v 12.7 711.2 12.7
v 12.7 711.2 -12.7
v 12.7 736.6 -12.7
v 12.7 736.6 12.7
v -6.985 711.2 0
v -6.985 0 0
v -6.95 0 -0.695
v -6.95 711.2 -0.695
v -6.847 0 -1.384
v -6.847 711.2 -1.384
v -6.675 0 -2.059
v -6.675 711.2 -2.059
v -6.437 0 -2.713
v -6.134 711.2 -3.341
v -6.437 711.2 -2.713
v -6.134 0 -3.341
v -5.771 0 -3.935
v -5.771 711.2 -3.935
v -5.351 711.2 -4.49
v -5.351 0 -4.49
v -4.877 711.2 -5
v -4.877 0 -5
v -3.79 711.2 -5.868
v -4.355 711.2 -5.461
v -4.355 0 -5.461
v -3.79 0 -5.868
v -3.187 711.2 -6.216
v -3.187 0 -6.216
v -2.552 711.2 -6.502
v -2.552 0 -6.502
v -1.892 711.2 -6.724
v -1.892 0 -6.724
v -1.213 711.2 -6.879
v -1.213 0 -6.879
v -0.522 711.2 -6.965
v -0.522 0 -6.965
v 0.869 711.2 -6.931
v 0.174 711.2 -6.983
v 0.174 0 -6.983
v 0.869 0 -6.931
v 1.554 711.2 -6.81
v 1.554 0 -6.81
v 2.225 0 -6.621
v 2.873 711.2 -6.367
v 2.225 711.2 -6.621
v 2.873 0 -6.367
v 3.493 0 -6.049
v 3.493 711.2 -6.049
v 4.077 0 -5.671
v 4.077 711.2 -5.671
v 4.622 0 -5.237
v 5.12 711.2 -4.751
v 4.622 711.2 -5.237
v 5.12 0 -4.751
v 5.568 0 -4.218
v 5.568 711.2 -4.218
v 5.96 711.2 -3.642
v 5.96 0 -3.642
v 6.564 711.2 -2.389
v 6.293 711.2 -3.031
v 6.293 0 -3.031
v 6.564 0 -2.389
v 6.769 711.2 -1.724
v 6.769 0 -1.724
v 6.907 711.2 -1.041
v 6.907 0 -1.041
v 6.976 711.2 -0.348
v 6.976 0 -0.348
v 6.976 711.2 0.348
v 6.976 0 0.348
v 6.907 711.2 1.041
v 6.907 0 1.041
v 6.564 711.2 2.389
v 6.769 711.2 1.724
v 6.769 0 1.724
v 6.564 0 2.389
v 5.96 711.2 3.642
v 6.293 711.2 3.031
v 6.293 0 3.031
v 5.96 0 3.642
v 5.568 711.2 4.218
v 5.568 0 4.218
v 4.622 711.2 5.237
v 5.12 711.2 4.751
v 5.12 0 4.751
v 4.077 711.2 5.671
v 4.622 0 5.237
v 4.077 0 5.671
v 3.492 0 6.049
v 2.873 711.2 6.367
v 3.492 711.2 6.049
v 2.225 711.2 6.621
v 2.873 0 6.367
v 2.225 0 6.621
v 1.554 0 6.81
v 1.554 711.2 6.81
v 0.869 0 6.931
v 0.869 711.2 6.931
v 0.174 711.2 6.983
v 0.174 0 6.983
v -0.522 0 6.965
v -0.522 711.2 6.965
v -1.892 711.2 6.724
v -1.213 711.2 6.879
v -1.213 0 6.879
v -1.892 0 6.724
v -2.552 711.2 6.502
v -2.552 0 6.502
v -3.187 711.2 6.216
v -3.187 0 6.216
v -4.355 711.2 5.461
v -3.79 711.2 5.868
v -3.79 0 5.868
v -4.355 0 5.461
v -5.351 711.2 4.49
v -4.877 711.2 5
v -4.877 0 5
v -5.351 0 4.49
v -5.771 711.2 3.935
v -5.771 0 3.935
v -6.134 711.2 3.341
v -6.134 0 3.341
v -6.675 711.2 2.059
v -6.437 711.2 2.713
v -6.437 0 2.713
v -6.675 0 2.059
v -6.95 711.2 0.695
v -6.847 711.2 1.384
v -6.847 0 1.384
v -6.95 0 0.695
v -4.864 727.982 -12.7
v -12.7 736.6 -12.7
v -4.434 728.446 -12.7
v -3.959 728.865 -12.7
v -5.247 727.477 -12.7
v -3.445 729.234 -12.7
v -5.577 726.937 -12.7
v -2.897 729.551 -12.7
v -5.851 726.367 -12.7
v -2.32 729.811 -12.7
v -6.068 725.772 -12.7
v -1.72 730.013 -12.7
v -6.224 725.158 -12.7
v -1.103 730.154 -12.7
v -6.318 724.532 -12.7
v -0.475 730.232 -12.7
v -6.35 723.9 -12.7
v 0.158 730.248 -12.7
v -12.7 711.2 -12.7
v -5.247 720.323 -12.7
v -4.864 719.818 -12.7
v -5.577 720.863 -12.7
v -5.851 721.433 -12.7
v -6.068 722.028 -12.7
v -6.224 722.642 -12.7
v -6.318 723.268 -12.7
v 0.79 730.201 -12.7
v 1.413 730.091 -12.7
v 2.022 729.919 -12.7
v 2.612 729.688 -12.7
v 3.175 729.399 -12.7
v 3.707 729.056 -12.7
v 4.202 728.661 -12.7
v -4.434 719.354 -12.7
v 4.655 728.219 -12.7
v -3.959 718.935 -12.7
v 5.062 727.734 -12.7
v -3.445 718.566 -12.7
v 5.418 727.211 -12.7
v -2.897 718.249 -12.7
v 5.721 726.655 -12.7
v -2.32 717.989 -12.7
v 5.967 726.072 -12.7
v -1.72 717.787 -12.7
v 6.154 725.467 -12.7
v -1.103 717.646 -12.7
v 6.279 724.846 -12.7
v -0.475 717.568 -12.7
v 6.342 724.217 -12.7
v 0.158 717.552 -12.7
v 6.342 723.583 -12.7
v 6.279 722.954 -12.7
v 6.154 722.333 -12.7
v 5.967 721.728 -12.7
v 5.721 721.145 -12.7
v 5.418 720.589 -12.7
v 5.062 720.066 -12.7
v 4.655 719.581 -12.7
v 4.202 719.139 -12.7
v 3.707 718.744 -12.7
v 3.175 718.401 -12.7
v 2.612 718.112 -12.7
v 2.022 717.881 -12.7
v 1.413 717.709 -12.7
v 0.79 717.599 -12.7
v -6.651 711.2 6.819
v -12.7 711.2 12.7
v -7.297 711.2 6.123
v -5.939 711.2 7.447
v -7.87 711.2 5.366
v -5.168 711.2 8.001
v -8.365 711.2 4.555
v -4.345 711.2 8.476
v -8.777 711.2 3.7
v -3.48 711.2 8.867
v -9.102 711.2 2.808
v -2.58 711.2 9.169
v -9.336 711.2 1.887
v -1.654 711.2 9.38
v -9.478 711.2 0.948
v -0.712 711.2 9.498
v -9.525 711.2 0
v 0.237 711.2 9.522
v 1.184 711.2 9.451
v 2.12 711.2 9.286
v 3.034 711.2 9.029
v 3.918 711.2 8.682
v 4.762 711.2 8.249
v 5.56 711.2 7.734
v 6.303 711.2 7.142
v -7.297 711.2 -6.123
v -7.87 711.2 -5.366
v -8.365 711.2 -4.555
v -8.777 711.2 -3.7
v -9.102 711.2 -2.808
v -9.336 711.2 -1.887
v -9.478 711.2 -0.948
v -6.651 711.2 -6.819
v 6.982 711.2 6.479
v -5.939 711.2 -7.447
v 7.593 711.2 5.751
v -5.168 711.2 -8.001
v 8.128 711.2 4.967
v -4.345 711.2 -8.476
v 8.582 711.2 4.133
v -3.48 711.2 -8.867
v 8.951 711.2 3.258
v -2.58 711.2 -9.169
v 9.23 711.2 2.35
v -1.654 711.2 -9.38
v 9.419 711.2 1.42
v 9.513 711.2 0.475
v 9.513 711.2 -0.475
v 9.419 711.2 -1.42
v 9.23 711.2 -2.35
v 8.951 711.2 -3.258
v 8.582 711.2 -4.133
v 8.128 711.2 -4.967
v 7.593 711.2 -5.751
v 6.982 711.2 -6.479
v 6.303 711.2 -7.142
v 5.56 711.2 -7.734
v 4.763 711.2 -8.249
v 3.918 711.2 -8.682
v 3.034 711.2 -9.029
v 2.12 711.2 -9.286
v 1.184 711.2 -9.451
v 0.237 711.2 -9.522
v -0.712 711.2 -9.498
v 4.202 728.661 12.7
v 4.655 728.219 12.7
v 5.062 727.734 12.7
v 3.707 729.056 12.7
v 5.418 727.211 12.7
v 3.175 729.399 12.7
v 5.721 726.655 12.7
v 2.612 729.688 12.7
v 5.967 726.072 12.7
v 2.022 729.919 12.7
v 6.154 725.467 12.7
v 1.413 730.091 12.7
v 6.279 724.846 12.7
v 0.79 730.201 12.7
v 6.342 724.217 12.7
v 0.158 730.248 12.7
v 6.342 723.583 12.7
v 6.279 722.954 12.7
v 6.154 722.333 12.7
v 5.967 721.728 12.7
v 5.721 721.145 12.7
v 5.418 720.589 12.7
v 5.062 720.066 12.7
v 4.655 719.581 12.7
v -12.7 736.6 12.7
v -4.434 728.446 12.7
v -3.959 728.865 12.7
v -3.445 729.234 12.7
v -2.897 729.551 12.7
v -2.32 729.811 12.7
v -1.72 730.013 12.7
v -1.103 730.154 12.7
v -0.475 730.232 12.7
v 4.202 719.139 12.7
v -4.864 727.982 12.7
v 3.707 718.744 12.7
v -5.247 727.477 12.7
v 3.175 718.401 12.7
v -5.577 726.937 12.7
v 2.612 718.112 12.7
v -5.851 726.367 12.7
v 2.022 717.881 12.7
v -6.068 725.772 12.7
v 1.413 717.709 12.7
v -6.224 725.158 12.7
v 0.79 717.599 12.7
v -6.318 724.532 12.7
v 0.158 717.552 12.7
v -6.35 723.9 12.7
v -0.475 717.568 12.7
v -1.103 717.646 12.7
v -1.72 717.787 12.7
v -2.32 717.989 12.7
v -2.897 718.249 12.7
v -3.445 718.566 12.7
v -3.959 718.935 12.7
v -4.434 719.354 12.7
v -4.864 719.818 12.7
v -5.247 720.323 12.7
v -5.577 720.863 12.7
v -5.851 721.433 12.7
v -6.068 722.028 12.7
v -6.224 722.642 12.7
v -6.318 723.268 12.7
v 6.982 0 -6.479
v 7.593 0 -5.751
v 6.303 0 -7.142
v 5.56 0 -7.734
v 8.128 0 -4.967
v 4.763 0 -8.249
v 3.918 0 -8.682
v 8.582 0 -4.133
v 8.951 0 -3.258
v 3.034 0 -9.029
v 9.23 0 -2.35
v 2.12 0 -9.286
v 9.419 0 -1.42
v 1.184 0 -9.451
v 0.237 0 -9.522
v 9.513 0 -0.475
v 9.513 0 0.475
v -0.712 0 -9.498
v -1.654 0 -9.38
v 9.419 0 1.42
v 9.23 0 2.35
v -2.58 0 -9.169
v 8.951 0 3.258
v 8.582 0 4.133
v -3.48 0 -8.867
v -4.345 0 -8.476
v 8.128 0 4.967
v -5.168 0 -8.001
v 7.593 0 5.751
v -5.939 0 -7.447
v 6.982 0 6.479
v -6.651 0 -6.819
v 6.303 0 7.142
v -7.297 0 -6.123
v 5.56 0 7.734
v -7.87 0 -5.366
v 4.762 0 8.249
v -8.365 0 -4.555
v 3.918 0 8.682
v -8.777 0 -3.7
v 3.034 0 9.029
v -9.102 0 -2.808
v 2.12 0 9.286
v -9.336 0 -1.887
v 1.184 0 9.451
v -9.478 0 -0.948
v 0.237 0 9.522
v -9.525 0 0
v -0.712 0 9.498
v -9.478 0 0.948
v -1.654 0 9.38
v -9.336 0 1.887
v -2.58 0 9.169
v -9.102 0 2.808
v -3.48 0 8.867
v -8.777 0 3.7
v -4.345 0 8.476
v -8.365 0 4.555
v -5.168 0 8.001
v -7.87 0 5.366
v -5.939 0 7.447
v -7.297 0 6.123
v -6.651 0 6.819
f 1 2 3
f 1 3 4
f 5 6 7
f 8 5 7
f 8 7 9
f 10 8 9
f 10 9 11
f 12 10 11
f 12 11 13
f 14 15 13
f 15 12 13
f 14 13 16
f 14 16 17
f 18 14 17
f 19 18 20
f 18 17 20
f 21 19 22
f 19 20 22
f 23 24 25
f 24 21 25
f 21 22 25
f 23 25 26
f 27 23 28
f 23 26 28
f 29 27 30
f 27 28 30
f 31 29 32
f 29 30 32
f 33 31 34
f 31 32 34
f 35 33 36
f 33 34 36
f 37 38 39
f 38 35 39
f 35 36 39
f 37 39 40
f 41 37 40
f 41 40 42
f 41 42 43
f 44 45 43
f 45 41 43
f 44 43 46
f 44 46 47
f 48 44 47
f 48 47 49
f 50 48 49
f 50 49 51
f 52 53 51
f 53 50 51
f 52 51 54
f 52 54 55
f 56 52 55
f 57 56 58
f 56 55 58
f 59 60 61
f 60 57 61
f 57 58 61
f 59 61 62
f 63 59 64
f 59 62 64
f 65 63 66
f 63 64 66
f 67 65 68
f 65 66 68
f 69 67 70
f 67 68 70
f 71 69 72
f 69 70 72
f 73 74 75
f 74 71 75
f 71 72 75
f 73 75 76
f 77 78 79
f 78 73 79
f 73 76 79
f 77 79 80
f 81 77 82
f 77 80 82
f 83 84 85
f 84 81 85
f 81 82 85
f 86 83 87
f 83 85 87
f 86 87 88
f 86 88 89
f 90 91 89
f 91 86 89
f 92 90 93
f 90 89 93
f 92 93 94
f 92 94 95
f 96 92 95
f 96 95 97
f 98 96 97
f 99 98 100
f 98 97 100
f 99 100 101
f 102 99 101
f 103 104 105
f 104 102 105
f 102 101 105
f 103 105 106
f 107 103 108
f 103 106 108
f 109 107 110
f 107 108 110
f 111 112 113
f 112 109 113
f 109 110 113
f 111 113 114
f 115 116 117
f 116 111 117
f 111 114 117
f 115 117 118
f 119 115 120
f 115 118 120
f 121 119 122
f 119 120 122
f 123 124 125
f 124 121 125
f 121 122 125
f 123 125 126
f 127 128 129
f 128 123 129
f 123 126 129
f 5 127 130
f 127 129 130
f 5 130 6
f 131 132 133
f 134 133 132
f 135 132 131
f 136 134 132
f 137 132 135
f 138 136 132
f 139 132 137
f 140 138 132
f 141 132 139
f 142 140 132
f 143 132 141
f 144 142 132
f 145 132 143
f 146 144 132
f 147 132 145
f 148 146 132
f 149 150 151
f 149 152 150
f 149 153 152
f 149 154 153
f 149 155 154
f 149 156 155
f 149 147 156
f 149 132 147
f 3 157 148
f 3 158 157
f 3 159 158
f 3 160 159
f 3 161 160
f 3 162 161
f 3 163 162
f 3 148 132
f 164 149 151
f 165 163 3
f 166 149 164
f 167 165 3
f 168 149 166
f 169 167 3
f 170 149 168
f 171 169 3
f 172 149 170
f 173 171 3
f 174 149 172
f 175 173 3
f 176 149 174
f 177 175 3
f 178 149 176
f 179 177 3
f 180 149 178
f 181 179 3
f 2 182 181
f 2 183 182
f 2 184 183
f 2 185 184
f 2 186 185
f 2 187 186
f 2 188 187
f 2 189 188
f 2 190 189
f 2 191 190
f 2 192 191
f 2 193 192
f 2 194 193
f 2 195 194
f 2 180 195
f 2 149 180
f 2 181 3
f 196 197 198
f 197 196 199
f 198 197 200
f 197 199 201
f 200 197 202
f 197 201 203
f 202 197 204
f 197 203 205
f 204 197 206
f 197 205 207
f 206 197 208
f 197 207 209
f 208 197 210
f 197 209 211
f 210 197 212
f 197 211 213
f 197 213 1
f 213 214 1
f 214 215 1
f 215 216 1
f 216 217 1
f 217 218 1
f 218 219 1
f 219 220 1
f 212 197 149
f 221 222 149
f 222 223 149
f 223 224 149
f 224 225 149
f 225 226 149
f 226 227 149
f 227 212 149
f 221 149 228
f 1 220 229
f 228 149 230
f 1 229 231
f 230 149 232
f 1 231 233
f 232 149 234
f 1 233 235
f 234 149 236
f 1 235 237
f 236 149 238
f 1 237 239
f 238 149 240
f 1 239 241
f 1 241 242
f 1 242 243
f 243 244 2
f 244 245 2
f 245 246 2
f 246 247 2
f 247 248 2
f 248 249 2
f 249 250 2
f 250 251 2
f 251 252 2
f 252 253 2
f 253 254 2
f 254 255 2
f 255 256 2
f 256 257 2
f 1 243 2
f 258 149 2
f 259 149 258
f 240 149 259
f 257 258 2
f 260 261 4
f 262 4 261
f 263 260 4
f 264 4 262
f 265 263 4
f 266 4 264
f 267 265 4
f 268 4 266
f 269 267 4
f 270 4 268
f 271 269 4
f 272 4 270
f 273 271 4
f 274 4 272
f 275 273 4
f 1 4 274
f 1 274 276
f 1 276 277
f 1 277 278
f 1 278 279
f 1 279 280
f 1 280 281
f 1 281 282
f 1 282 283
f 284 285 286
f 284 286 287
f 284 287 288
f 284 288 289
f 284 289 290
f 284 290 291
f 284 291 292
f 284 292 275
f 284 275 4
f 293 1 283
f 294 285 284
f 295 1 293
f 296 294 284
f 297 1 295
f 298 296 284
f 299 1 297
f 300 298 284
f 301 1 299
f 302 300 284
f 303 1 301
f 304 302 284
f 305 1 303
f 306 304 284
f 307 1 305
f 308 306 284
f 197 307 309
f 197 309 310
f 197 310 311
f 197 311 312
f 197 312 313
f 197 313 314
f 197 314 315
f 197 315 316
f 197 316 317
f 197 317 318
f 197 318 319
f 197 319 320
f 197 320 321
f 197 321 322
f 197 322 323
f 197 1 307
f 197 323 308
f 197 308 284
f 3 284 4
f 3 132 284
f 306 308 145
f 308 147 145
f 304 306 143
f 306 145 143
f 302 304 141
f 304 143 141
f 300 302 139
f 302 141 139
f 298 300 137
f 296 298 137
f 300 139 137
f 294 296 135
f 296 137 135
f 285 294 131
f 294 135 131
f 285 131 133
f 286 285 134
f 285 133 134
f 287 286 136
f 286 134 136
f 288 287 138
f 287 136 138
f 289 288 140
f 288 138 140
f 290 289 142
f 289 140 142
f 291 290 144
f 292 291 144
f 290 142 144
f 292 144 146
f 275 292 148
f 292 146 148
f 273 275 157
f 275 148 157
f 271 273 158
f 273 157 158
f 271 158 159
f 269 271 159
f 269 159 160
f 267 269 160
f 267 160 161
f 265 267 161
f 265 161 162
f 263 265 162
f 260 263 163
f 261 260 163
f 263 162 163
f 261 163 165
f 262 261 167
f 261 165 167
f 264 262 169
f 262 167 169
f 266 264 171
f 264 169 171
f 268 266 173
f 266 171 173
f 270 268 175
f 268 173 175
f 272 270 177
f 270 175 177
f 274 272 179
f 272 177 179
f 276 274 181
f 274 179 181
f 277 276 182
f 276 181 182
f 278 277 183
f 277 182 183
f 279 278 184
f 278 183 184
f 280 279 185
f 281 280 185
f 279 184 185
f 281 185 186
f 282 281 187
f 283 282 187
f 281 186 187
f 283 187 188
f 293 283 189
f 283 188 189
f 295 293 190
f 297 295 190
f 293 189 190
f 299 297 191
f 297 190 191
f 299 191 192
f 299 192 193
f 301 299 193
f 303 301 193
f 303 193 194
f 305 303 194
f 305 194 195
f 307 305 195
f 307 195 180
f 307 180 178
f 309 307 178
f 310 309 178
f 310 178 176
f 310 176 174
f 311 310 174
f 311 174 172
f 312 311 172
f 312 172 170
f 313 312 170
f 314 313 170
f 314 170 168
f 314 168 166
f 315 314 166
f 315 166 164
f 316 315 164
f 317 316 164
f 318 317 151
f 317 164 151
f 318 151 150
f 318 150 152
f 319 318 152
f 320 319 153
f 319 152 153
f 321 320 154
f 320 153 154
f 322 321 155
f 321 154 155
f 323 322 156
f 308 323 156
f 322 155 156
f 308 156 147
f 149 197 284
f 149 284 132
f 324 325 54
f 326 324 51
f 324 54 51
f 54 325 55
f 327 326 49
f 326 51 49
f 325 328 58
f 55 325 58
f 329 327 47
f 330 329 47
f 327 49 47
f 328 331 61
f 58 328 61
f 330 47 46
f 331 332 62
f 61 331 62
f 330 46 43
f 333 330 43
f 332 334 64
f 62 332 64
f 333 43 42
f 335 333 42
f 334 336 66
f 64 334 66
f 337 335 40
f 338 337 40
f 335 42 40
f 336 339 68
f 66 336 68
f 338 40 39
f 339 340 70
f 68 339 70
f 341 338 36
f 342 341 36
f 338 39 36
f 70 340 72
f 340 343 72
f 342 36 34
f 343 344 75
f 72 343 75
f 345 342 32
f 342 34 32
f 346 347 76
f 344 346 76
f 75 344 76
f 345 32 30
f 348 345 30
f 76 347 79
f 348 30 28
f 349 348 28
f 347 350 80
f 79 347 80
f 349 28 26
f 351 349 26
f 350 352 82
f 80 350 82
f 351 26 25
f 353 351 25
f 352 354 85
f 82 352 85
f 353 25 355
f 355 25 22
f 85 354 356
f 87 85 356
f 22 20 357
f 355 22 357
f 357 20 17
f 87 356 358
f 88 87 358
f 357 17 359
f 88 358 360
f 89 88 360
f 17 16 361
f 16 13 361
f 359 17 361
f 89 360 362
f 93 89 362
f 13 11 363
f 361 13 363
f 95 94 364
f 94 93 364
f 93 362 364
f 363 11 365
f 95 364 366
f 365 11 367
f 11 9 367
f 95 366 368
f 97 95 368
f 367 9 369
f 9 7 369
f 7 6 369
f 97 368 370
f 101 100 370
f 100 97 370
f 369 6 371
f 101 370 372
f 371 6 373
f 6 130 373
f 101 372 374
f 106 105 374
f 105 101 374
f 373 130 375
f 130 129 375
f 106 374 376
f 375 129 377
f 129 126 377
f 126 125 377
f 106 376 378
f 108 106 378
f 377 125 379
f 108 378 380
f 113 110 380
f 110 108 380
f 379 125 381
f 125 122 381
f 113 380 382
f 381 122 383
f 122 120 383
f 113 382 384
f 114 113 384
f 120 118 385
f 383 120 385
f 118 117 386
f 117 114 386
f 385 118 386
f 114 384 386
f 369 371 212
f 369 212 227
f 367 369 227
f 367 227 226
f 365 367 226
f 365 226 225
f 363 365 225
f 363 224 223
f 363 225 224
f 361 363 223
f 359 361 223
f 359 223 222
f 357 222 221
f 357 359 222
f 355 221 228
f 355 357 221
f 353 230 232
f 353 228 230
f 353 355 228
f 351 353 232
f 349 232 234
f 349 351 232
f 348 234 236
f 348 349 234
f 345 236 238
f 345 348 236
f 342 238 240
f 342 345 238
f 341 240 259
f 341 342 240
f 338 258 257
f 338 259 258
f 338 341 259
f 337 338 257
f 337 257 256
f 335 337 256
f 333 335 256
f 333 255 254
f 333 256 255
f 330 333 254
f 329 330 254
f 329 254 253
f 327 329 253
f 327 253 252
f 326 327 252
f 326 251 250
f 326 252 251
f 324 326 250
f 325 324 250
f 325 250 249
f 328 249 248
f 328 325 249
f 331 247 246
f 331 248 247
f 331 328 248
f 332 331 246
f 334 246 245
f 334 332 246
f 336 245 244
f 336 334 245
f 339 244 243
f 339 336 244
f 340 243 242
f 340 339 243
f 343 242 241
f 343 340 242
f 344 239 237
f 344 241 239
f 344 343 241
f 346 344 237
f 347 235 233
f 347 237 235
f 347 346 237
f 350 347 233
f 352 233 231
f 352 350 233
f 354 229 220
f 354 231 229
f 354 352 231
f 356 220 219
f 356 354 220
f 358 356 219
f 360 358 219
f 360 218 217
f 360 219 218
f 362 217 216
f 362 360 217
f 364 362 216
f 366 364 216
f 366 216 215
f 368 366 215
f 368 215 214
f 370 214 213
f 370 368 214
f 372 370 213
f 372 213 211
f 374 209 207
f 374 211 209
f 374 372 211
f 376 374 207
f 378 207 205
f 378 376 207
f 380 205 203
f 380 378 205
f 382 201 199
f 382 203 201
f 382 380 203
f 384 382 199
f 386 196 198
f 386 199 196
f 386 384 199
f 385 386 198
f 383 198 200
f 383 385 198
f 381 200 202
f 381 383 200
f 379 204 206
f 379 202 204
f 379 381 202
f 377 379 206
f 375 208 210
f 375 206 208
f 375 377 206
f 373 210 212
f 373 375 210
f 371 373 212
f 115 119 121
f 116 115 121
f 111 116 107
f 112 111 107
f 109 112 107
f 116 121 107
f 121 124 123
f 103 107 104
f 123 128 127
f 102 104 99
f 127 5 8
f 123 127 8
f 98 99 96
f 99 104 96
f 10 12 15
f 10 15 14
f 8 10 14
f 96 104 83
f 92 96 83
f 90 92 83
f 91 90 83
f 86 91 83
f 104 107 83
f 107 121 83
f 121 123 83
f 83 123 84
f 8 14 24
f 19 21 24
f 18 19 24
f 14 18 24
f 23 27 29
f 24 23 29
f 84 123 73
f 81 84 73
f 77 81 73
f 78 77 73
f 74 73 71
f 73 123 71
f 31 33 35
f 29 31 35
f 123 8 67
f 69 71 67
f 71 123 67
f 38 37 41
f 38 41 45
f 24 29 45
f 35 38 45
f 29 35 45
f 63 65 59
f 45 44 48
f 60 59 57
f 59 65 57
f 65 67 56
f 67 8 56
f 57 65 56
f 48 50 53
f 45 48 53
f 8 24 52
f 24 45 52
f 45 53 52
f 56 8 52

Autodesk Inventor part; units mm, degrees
ref_plane "YZ Plane" through (0, 0, 0) normal (1, 0, 0) x (0, 1, 0)
ref_plane "XZ Plane" through (0, 0, 0) normal (0, 1, 0) x (-1, 0, 0)
ref_plane "XY Plane" through (0, 0, 0) normal (0, 0, 1) x (1, 0, 0)
sketch "Sketch1" plane through (0, 0, 0) normal (0, 1, 0) x (-1, 0, 0)
  circle A0 centre (0, 0) radius 9.525
  circle A1 centre (0, 0) radius 6.985
  dimension "d0" = 19.05
  dimension "d1" = 2.54
  dimension "d2" = 13.97
extrude "Extrusion1" add sketch "Sketch1" along normal blind 711.2
sketch "Sketch3" plane through (0, 711.2, 0) normal (0, 1, 0) x (1, 0, 0)
  line L0 (12.7, -12.7) -> (-12.7, -12.7)
  line L1 (-12.7, -12.7) -> (-12.7, 12.7)
  line L2 (-12.7, 12.7) -> (12.7, 12.7)
  line L3 (12.7, 12.7) -> (12.7, -12.7)
  point P0 (0, 0)
  point P1 (0, 0)
  dimension "d7" = 25.4
  dimension "d8" = 25.4
extrude "Extrusion2" add sketch "Sketch3" along normal blind 25.4
sketch "Sketch4" plane through (12.7, 711.2, -12.7) normal (0, 0, -1) x (-1, 0, 0)
  line L0 (25.4, 0) -> (25.4, 25.4) projected
  line L1 (0, 0) -> (0, 25.4) projected
  circle A0 centre (12.7, 12.7) radius 6.35
  point P0 (12.7, -711.2)
  dimension "d11" = 12.7
extrude "Extrusion3" cut sketch "Sketch4" against normal blind 42.8625
properties part number "OuterLever"
